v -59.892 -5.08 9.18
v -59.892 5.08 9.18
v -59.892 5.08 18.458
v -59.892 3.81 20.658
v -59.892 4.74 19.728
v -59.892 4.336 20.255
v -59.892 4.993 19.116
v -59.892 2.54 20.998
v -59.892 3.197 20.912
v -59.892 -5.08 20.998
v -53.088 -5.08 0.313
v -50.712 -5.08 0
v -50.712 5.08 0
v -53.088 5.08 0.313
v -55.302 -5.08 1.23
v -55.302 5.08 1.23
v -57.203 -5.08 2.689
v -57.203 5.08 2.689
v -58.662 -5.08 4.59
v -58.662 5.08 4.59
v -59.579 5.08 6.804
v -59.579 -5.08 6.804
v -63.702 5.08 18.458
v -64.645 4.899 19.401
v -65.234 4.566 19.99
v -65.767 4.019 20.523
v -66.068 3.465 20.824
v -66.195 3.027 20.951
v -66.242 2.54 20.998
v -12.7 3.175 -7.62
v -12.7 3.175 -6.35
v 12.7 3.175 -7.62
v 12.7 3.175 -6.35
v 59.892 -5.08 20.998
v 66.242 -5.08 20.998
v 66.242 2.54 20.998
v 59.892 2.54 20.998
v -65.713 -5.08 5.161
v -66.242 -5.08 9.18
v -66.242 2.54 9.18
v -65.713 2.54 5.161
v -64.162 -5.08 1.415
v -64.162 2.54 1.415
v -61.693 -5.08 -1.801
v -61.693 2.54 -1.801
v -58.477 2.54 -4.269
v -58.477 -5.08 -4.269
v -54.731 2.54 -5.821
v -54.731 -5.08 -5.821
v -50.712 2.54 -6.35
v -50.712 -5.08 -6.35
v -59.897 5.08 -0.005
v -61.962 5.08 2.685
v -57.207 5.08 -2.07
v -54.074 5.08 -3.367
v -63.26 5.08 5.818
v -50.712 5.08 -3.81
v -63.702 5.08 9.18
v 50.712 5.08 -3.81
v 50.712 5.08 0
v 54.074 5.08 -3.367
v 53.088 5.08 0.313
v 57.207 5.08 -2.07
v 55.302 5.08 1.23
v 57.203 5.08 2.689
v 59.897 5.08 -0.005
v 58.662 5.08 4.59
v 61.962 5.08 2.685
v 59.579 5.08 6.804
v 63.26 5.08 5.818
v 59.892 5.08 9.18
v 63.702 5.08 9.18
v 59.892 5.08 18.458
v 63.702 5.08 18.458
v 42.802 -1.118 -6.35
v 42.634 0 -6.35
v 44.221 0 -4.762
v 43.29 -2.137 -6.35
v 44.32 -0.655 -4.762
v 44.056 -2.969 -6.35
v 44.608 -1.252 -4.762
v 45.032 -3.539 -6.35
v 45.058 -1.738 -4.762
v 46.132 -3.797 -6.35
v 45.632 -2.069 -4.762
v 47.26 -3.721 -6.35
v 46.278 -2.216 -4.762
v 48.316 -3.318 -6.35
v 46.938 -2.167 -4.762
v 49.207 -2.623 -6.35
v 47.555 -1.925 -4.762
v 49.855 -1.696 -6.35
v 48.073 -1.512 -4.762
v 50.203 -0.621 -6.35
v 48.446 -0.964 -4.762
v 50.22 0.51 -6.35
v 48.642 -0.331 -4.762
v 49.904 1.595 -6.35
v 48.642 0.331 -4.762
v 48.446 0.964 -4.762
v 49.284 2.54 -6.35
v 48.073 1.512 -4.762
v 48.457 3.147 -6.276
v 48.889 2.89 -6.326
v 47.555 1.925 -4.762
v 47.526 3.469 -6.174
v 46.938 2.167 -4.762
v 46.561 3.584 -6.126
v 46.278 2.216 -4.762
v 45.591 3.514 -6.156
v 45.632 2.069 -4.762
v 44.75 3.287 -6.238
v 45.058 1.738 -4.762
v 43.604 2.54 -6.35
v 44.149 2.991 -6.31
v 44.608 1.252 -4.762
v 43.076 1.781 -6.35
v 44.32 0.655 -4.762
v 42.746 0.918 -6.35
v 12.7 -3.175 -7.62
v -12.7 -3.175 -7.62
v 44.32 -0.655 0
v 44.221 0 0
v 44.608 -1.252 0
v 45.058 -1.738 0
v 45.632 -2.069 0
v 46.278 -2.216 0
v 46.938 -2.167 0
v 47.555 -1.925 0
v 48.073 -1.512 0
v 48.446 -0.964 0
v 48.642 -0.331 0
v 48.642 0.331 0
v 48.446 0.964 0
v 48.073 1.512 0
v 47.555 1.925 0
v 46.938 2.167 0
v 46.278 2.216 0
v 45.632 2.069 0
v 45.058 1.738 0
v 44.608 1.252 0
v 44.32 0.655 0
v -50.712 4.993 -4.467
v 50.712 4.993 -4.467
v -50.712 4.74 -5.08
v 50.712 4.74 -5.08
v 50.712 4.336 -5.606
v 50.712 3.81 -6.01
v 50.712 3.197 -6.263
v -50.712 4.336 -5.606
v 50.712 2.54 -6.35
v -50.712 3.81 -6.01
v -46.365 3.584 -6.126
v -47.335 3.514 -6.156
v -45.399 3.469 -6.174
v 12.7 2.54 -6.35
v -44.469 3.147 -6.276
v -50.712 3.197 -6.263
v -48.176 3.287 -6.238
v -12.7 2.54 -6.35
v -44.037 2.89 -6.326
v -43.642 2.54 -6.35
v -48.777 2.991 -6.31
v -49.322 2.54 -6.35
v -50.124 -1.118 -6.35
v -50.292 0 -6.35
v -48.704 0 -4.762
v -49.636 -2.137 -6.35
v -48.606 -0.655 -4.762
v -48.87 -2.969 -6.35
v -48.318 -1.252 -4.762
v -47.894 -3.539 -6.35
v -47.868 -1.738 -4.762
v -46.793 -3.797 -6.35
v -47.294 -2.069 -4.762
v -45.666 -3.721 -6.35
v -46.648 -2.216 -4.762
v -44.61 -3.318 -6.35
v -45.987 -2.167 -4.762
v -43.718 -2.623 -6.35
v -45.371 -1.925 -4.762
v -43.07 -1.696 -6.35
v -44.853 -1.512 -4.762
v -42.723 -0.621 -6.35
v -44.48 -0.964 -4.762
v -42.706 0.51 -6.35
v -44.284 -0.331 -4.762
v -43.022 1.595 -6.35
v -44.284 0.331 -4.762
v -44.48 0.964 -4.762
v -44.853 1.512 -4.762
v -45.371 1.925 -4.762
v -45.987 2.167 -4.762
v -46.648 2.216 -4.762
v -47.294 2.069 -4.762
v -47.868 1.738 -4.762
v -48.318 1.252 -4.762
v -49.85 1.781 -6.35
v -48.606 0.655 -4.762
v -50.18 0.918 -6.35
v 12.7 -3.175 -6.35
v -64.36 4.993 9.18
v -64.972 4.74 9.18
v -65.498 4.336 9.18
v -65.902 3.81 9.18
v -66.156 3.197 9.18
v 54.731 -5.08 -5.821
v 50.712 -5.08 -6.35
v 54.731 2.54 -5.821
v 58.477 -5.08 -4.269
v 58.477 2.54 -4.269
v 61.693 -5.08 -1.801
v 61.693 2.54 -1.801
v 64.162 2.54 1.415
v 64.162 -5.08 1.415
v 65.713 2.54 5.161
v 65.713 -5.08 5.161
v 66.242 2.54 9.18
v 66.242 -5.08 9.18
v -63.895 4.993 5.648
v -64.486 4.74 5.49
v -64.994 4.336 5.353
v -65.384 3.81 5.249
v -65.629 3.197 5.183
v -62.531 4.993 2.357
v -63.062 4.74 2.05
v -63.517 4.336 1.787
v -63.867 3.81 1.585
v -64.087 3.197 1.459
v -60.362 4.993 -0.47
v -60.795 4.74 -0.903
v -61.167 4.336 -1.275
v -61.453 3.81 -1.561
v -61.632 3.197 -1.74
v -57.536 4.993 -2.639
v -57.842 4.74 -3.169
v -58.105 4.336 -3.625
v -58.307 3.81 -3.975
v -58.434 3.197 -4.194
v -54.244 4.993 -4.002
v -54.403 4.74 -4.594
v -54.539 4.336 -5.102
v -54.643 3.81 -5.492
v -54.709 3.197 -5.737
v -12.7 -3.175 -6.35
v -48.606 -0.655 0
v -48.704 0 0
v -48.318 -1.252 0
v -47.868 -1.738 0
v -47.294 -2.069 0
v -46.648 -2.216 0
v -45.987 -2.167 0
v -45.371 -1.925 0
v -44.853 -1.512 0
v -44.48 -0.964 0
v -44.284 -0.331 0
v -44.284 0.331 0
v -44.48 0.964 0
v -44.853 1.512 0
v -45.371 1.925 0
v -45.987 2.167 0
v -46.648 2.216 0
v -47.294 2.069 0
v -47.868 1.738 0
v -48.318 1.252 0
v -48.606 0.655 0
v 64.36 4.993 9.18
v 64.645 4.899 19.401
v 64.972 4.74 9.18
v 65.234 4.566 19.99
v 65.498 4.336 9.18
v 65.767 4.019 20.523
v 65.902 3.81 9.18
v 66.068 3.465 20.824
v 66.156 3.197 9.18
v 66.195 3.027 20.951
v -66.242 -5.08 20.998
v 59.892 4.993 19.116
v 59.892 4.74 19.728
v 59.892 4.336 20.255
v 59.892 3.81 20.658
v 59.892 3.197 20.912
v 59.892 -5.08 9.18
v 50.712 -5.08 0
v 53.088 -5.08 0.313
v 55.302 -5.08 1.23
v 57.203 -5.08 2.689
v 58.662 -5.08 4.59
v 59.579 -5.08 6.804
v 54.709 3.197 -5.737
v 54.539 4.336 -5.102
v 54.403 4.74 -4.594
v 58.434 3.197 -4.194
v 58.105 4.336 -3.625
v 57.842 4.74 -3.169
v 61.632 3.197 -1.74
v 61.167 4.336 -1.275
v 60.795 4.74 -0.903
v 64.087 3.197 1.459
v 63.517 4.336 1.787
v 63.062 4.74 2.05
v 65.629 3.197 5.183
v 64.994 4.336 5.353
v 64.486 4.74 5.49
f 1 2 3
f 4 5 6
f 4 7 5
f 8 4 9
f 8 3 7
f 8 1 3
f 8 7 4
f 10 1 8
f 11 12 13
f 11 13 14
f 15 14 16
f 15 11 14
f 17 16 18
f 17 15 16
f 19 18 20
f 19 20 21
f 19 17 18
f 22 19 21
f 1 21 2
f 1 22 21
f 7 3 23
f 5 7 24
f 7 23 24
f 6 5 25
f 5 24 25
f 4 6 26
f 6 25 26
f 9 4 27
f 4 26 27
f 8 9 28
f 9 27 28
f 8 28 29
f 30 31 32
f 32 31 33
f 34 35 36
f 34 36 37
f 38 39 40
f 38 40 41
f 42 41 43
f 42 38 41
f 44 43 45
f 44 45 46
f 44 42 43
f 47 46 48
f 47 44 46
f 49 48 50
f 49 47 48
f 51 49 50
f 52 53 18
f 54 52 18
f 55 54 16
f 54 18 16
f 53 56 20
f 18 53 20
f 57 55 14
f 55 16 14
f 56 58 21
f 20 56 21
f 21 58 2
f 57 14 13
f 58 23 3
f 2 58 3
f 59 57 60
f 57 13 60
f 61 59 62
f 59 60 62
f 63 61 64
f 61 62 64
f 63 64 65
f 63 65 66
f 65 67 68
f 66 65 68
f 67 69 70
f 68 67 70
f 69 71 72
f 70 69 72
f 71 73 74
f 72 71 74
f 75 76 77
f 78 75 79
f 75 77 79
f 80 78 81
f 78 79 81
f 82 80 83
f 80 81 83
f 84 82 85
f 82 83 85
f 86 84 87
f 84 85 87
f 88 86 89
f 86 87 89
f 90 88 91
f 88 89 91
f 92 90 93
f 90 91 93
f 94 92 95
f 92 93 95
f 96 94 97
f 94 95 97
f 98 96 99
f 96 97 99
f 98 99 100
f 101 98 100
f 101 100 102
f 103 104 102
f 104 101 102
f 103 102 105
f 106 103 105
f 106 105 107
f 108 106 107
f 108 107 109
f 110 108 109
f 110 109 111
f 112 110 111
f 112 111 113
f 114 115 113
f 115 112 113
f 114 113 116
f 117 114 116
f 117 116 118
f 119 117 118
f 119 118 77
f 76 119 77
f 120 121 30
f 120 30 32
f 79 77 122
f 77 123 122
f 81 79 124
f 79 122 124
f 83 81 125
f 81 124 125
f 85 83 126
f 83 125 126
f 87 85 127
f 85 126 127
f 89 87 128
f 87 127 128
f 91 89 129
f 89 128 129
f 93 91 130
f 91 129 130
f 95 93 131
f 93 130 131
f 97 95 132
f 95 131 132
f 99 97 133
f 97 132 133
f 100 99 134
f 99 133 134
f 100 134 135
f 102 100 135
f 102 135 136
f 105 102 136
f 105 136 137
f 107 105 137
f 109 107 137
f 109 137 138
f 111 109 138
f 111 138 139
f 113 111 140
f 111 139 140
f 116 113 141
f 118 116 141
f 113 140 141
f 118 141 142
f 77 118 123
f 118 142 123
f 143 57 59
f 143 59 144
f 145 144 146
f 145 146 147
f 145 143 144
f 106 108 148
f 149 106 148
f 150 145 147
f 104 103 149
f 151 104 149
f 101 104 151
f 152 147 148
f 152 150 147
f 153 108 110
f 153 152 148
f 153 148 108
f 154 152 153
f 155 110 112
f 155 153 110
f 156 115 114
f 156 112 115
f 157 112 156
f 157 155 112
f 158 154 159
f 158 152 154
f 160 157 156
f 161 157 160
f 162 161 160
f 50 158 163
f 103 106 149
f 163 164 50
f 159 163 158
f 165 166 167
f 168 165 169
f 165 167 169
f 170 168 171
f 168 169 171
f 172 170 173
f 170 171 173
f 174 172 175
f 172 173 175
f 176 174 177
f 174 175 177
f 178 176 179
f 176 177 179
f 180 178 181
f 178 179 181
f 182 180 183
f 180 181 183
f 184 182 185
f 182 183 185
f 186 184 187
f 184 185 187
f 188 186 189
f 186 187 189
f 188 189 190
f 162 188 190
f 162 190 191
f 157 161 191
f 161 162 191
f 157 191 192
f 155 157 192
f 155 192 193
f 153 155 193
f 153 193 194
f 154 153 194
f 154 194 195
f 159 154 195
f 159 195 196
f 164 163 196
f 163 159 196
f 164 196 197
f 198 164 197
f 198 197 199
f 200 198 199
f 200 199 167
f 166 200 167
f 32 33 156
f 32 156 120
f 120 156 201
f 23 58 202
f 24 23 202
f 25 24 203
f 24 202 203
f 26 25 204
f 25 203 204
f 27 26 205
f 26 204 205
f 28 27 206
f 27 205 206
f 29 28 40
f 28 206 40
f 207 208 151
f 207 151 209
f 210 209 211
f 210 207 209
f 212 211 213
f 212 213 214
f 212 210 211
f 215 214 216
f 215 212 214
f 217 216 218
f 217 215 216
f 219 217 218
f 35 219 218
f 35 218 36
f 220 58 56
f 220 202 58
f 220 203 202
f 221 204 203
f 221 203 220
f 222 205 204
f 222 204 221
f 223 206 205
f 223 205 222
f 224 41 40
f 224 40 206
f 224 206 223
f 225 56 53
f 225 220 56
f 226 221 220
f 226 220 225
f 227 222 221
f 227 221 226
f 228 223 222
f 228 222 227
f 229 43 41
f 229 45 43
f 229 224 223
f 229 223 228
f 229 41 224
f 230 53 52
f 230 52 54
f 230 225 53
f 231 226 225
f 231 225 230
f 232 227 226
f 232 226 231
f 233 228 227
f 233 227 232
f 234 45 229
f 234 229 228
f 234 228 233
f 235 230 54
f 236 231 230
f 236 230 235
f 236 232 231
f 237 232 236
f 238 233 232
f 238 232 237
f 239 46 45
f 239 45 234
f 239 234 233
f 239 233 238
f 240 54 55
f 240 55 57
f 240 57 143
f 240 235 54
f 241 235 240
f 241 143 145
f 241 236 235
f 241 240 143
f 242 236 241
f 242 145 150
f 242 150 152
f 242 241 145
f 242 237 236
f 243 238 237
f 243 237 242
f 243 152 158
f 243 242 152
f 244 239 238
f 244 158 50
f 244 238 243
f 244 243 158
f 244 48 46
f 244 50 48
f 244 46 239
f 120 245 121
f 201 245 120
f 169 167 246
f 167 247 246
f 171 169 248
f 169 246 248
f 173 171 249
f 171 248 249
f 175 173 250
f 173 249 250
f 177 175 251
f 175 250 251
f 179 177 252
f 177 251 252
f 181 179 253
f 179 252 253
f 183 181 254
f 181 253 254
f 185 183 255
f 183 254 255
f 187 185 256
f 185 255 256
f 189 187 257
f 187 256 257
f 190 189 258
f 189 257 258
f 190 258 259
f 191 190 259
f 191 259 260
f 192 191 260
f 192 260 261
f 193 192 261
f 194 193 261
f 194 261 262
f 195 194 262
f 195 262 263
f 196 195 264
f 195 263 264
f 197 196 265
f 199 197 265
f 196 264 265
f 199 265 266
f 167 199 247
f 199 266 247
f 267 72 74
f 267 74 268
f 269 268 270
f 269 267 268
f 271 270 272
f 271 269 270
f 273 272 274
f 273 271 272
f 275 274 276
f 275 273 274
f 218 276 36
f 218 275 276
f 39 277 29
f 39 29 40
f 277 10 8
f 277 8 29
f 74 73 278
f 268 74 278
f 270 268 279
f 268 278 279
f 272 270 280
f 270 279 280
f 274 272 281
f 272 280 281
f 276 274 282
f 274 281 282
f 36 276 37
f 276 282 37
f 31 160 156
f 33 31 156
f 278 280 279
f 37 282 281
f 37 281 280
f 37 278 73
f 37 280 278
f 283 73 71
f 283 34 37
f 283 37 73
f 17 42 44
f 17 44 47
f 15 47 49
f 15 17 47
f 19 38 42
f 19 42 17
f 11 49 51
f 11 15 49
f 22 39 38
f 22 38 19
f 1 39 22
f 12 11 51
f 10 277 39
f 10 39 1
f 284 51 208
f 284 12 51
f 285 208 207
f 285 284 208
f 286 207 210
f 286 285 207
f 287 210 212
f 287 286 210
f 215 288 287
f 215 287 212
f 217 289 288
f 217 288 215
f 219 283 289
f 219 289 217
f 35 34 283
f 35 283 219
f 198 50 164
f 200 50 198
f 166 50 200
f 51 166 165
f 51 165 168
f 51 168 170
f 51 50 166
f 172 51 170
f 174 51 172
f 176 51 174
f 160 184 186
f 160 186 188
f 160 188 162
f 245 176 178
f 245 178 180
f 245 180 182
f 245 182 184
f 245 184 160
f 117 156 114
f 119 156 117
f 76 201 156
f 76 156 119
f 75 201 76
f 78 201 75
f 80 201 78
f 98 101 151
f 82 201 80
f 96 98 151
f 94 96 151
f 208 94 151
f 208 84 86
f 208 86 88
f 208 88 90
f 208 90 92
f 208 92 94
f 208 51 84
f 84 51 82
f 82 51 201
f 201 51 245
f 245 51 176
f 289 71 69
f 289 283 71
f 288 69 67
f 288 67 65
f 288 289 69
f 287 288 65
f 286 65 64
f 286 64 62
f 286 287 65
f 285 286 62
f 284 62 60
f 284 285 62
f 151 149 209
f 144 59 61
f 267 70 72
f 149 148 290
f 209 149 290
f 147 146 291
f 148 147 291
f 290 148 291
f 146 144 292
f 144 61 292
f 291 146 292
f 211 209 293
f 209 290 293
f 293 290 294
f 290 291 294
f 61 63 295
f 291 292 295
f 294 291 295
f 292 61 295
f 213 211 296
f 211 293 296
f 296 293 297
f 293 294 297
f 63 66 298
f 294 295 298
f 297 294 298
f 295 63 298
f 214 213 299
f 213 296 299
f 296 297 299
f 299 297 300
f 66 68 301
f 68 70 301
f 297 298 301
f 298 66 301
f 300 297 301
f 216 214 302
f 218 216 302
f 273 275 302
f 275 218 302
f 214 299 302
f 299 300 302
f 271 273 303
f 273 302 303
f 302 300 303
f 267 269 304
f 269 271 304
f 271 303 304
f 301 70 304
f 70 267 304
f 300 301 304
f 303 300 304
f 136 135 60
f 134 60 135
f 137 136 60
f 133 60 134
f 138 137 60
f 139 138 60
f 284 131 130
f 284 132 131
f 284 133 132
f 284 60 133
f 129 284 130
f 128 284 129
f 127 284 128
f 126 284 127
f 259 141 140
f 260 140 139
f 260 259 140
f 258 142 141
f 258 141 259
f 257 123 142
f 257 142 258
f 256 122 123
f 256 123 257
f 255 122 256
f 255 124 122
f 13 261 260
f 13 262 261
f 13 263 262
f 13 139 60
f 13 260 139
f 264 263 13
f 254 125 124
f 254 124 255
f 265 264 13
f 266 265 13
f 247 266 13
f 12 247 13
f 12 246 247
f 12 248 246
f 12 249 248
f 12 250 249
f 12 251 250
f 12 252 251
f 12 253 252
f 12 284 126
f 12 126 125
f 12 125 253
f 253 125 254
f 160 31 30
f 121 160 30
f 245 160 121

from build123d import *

# Parameters (mm, degrees)
F1_DEPTH       = 5.08
F3_D           = 4.445
F3_CSINK_D     = 7.62
F3_CSINK_ANGLE = 90
F4_T1_DEPTH    = 101.4234647155
F4_T3_DEPTH    = 19.05
F4_T5_DEPTH    = 19.05
F4_T7_DEPTH    = 18.1679810636
F4_T10_ANGLE   = 90
F4_T12_ANGLE   = 90
F5_W           = 25.4
F5_H           = 6.35
F6_DEPTH       = 1.27


# Not quite as in the source:
# - a fillet or chamfer that OpenCascade refuses, or shapes differently, is made with other operations: its cross-section is extruded or revolved along the edge and cut away or added


with BuildPart() as f1:
    # F0 (on Front) → F1 (new body, symmetric)
    with BuildSketch(Plane.XZ):
        with BuildLine():
            Line((50.7117323577, 0), (0, 0))
            Line((0, 0), (-50.7117323577, 0))
            ThreePointArc((-50.7117323577, 0), (-57.2033226337, 2.6889047337), (-59.8922273673, 9.1804950096))
            Line((-59.8922273673, 9.1804950096), (-59.8922273673, 20.9984760731))
            Line((-59.8922273673, 20.9984760731), (-66.2422273673, 20.9984760731))
            Line((-66.2422273673, 20.9984760731), (-66.2422273673, 9.1804950096))
            ThreePointArc((-66.2422273673, 9.1804950096), (-61.6934506942, -1.8012233269), (-50.7117323577, -6.35))
            Line((-50.7117323577, -6.35), (0, -6.35))
            Line((0, -6.35), (50.7117323577, -6.35))
            ThreePointArc((50.7117323577, -6.35), (61.6934506942, -1.8012233269), (66.2422273673, 9.1804950096))
            Line((66.2422273673, 9.1804950096), (66.2422273673, 20.9984760731))
            Line((66.2422273673, 20.9984760731), (59.8922273673, 20.9984760731))
            Line((59.8922273673, 20.9984760731), (59.8922273673, 9.1804950096))
            ThreePointArc((59.8922273673, 9.1804950096), (57.2033226337, 2.6889047337), (50.7117323577, 0))
        make_face()
    extrude(amount=F1_DEPTH, both=True)

    # F3 (through all)
    with Locations(Plane(origin=(0, 0, -6.35), x_dir=(1, 0, 0), z_dir=(0, 0, -1))):
        with Locations((-46.4819967747, 0), (46.443849802, 0)):
            CounterSinkHole(F3_D / 2, F3_CSINK_D / 2, counter_sink_angle=F3_CSINK_ANGLE)

    # F4: fillet of radius 2.54 on 7 edges, made by hand

    # F4_s2 → F4_t1 (cut)
    with BuildSketch(Plane.YZ.offset(-50.7117323577)):
        with BuildLine():
            ThreePointArc((5.08, -3.81), (4.3360512242, -5.6060512242), (2.54, -6.35))
            Line((2.54, -6.35), (5.08, -6.35))
            Line((5.08, -6.35), (5.08, -3.81))
        make_face()
    extrude(amount=F4_T1_DEPTH, mode=Mode.SUBTRACT)

    # F4_s4 → F4_t3 (cut)
    with BuildSketch(Plane.YZ.offset(53.5422273673)):
        with BuildLine():
            ThreePointArc((5.08, 18.4584760731), (4.3360512242, 20.2545272974), (2.54, 20.9984760731))
            Line((2.54, 20.9984760731), (5.08, 20.9984760731))
            Line((5.08, 20.9984760731), (5.08, 18.4584760731))
        make_face()
    extrude(amount=F4_T3_DEPTH, mode=Mode.SUBTRACT)

    # F4_s6 → F4_t5 (cut)
    with BuildSketch(Plane.YZ.offset(-72.5922273673)):
        with BuildLine():
            ThreePointArc((5.08, 18.4584760731), (4.3360512242, 20.2545272974), (2.54, 20.9984760731))
            Line((2.54, 20.9984760731), (5.08, 20.9984760731))
            Line((5.08, 20.9984760731), (5.08, 18.4584760731))
        make_face()
    extrude(amount=F4_T5_DEPTH, mode=Mode.SUBTRACT)

    # F4_s8 → F4_t7 (cut)
    with BuildSketch(Plane.XY.offset(9.1804950096)):
        with BuildLine():
            ThreePointArc((63.7022273673, 5.08), (65.4982785915, 4.3360512242), (66.2422273673, 2.54))
            Line((66.2422273673, 2.54), (66.2422273673, 5.08))
            Line((66.2422273673, 5.08), (63.7022273673, 5.08))
        make_face()
        with BuildLine():
            ThreePointArc((-63.7022273673, 5.08), (-65.4982785915, 4.3360512242), (-66.2422273673, 2.54))
            Line((-66.2422273673, 2.54), (-66.2422273673, 5.08))
            Line((-66.2422273673, 5.08), (-63.7022273673, 5.08))
        make_face()
    extrude(amount=F4_T7_DEPTH, mode=Mode.SUBTRACT)

    # F4_s9 → F4_t10 (revolve, cut)
    with BuildSketch(Plane.YZ.offset(50.7117323577)):
        with BuildLine():
            ThreePointArc((2.54, -6.35), (4.3360512242, -5.6060512242), (5.08, -3.81))
            Line((5.08, -3.81), (5.08, -6.35))
            Line((5.08, -6.35), (2.54, -6.35))
        make_face()
    revolve(axis=Axis((50.7117323577, 5.08, 9.1804950096), (0, -1, 0)), revolution_arc=F4_T10_ANGLE, mode=Mode.SUBTRACT)

    # F4_s11 → F4_t12 (revolve, cut)
    with BuildSketch(Plane.XY.offset(9.1804950096)):
        with BuildLine():
            ThreePointArc((-63.7022273673, 5.08), (-65.4982785915, 4.3360512242), (-66.2422273673, 2.54))
            Line((-66.2422273673, 2.54), (-66.2422273673, 5.08))
            Line((-66.2422273673, 5.08), (-63.7022273673, 5.08))
        make_face()
    revolve(axis=Axis((-50.7117323577, 5.08, 9.1804950096), (0, -1, 0)), revolution_arc=F4_T12_ANGLE, mode=Mode.SUBTRACT)

    # F5 (on face) → F6 (join)
    with BuildSketch(Plane(origin=(0, 0, -6.35), x_dir=(1, 0, 0), z_dir=(0, 0, -1))):
        Rectangle(F5_W, F5_H)
    extrude(amount=F6_DEPTH)


solid = f1.part
